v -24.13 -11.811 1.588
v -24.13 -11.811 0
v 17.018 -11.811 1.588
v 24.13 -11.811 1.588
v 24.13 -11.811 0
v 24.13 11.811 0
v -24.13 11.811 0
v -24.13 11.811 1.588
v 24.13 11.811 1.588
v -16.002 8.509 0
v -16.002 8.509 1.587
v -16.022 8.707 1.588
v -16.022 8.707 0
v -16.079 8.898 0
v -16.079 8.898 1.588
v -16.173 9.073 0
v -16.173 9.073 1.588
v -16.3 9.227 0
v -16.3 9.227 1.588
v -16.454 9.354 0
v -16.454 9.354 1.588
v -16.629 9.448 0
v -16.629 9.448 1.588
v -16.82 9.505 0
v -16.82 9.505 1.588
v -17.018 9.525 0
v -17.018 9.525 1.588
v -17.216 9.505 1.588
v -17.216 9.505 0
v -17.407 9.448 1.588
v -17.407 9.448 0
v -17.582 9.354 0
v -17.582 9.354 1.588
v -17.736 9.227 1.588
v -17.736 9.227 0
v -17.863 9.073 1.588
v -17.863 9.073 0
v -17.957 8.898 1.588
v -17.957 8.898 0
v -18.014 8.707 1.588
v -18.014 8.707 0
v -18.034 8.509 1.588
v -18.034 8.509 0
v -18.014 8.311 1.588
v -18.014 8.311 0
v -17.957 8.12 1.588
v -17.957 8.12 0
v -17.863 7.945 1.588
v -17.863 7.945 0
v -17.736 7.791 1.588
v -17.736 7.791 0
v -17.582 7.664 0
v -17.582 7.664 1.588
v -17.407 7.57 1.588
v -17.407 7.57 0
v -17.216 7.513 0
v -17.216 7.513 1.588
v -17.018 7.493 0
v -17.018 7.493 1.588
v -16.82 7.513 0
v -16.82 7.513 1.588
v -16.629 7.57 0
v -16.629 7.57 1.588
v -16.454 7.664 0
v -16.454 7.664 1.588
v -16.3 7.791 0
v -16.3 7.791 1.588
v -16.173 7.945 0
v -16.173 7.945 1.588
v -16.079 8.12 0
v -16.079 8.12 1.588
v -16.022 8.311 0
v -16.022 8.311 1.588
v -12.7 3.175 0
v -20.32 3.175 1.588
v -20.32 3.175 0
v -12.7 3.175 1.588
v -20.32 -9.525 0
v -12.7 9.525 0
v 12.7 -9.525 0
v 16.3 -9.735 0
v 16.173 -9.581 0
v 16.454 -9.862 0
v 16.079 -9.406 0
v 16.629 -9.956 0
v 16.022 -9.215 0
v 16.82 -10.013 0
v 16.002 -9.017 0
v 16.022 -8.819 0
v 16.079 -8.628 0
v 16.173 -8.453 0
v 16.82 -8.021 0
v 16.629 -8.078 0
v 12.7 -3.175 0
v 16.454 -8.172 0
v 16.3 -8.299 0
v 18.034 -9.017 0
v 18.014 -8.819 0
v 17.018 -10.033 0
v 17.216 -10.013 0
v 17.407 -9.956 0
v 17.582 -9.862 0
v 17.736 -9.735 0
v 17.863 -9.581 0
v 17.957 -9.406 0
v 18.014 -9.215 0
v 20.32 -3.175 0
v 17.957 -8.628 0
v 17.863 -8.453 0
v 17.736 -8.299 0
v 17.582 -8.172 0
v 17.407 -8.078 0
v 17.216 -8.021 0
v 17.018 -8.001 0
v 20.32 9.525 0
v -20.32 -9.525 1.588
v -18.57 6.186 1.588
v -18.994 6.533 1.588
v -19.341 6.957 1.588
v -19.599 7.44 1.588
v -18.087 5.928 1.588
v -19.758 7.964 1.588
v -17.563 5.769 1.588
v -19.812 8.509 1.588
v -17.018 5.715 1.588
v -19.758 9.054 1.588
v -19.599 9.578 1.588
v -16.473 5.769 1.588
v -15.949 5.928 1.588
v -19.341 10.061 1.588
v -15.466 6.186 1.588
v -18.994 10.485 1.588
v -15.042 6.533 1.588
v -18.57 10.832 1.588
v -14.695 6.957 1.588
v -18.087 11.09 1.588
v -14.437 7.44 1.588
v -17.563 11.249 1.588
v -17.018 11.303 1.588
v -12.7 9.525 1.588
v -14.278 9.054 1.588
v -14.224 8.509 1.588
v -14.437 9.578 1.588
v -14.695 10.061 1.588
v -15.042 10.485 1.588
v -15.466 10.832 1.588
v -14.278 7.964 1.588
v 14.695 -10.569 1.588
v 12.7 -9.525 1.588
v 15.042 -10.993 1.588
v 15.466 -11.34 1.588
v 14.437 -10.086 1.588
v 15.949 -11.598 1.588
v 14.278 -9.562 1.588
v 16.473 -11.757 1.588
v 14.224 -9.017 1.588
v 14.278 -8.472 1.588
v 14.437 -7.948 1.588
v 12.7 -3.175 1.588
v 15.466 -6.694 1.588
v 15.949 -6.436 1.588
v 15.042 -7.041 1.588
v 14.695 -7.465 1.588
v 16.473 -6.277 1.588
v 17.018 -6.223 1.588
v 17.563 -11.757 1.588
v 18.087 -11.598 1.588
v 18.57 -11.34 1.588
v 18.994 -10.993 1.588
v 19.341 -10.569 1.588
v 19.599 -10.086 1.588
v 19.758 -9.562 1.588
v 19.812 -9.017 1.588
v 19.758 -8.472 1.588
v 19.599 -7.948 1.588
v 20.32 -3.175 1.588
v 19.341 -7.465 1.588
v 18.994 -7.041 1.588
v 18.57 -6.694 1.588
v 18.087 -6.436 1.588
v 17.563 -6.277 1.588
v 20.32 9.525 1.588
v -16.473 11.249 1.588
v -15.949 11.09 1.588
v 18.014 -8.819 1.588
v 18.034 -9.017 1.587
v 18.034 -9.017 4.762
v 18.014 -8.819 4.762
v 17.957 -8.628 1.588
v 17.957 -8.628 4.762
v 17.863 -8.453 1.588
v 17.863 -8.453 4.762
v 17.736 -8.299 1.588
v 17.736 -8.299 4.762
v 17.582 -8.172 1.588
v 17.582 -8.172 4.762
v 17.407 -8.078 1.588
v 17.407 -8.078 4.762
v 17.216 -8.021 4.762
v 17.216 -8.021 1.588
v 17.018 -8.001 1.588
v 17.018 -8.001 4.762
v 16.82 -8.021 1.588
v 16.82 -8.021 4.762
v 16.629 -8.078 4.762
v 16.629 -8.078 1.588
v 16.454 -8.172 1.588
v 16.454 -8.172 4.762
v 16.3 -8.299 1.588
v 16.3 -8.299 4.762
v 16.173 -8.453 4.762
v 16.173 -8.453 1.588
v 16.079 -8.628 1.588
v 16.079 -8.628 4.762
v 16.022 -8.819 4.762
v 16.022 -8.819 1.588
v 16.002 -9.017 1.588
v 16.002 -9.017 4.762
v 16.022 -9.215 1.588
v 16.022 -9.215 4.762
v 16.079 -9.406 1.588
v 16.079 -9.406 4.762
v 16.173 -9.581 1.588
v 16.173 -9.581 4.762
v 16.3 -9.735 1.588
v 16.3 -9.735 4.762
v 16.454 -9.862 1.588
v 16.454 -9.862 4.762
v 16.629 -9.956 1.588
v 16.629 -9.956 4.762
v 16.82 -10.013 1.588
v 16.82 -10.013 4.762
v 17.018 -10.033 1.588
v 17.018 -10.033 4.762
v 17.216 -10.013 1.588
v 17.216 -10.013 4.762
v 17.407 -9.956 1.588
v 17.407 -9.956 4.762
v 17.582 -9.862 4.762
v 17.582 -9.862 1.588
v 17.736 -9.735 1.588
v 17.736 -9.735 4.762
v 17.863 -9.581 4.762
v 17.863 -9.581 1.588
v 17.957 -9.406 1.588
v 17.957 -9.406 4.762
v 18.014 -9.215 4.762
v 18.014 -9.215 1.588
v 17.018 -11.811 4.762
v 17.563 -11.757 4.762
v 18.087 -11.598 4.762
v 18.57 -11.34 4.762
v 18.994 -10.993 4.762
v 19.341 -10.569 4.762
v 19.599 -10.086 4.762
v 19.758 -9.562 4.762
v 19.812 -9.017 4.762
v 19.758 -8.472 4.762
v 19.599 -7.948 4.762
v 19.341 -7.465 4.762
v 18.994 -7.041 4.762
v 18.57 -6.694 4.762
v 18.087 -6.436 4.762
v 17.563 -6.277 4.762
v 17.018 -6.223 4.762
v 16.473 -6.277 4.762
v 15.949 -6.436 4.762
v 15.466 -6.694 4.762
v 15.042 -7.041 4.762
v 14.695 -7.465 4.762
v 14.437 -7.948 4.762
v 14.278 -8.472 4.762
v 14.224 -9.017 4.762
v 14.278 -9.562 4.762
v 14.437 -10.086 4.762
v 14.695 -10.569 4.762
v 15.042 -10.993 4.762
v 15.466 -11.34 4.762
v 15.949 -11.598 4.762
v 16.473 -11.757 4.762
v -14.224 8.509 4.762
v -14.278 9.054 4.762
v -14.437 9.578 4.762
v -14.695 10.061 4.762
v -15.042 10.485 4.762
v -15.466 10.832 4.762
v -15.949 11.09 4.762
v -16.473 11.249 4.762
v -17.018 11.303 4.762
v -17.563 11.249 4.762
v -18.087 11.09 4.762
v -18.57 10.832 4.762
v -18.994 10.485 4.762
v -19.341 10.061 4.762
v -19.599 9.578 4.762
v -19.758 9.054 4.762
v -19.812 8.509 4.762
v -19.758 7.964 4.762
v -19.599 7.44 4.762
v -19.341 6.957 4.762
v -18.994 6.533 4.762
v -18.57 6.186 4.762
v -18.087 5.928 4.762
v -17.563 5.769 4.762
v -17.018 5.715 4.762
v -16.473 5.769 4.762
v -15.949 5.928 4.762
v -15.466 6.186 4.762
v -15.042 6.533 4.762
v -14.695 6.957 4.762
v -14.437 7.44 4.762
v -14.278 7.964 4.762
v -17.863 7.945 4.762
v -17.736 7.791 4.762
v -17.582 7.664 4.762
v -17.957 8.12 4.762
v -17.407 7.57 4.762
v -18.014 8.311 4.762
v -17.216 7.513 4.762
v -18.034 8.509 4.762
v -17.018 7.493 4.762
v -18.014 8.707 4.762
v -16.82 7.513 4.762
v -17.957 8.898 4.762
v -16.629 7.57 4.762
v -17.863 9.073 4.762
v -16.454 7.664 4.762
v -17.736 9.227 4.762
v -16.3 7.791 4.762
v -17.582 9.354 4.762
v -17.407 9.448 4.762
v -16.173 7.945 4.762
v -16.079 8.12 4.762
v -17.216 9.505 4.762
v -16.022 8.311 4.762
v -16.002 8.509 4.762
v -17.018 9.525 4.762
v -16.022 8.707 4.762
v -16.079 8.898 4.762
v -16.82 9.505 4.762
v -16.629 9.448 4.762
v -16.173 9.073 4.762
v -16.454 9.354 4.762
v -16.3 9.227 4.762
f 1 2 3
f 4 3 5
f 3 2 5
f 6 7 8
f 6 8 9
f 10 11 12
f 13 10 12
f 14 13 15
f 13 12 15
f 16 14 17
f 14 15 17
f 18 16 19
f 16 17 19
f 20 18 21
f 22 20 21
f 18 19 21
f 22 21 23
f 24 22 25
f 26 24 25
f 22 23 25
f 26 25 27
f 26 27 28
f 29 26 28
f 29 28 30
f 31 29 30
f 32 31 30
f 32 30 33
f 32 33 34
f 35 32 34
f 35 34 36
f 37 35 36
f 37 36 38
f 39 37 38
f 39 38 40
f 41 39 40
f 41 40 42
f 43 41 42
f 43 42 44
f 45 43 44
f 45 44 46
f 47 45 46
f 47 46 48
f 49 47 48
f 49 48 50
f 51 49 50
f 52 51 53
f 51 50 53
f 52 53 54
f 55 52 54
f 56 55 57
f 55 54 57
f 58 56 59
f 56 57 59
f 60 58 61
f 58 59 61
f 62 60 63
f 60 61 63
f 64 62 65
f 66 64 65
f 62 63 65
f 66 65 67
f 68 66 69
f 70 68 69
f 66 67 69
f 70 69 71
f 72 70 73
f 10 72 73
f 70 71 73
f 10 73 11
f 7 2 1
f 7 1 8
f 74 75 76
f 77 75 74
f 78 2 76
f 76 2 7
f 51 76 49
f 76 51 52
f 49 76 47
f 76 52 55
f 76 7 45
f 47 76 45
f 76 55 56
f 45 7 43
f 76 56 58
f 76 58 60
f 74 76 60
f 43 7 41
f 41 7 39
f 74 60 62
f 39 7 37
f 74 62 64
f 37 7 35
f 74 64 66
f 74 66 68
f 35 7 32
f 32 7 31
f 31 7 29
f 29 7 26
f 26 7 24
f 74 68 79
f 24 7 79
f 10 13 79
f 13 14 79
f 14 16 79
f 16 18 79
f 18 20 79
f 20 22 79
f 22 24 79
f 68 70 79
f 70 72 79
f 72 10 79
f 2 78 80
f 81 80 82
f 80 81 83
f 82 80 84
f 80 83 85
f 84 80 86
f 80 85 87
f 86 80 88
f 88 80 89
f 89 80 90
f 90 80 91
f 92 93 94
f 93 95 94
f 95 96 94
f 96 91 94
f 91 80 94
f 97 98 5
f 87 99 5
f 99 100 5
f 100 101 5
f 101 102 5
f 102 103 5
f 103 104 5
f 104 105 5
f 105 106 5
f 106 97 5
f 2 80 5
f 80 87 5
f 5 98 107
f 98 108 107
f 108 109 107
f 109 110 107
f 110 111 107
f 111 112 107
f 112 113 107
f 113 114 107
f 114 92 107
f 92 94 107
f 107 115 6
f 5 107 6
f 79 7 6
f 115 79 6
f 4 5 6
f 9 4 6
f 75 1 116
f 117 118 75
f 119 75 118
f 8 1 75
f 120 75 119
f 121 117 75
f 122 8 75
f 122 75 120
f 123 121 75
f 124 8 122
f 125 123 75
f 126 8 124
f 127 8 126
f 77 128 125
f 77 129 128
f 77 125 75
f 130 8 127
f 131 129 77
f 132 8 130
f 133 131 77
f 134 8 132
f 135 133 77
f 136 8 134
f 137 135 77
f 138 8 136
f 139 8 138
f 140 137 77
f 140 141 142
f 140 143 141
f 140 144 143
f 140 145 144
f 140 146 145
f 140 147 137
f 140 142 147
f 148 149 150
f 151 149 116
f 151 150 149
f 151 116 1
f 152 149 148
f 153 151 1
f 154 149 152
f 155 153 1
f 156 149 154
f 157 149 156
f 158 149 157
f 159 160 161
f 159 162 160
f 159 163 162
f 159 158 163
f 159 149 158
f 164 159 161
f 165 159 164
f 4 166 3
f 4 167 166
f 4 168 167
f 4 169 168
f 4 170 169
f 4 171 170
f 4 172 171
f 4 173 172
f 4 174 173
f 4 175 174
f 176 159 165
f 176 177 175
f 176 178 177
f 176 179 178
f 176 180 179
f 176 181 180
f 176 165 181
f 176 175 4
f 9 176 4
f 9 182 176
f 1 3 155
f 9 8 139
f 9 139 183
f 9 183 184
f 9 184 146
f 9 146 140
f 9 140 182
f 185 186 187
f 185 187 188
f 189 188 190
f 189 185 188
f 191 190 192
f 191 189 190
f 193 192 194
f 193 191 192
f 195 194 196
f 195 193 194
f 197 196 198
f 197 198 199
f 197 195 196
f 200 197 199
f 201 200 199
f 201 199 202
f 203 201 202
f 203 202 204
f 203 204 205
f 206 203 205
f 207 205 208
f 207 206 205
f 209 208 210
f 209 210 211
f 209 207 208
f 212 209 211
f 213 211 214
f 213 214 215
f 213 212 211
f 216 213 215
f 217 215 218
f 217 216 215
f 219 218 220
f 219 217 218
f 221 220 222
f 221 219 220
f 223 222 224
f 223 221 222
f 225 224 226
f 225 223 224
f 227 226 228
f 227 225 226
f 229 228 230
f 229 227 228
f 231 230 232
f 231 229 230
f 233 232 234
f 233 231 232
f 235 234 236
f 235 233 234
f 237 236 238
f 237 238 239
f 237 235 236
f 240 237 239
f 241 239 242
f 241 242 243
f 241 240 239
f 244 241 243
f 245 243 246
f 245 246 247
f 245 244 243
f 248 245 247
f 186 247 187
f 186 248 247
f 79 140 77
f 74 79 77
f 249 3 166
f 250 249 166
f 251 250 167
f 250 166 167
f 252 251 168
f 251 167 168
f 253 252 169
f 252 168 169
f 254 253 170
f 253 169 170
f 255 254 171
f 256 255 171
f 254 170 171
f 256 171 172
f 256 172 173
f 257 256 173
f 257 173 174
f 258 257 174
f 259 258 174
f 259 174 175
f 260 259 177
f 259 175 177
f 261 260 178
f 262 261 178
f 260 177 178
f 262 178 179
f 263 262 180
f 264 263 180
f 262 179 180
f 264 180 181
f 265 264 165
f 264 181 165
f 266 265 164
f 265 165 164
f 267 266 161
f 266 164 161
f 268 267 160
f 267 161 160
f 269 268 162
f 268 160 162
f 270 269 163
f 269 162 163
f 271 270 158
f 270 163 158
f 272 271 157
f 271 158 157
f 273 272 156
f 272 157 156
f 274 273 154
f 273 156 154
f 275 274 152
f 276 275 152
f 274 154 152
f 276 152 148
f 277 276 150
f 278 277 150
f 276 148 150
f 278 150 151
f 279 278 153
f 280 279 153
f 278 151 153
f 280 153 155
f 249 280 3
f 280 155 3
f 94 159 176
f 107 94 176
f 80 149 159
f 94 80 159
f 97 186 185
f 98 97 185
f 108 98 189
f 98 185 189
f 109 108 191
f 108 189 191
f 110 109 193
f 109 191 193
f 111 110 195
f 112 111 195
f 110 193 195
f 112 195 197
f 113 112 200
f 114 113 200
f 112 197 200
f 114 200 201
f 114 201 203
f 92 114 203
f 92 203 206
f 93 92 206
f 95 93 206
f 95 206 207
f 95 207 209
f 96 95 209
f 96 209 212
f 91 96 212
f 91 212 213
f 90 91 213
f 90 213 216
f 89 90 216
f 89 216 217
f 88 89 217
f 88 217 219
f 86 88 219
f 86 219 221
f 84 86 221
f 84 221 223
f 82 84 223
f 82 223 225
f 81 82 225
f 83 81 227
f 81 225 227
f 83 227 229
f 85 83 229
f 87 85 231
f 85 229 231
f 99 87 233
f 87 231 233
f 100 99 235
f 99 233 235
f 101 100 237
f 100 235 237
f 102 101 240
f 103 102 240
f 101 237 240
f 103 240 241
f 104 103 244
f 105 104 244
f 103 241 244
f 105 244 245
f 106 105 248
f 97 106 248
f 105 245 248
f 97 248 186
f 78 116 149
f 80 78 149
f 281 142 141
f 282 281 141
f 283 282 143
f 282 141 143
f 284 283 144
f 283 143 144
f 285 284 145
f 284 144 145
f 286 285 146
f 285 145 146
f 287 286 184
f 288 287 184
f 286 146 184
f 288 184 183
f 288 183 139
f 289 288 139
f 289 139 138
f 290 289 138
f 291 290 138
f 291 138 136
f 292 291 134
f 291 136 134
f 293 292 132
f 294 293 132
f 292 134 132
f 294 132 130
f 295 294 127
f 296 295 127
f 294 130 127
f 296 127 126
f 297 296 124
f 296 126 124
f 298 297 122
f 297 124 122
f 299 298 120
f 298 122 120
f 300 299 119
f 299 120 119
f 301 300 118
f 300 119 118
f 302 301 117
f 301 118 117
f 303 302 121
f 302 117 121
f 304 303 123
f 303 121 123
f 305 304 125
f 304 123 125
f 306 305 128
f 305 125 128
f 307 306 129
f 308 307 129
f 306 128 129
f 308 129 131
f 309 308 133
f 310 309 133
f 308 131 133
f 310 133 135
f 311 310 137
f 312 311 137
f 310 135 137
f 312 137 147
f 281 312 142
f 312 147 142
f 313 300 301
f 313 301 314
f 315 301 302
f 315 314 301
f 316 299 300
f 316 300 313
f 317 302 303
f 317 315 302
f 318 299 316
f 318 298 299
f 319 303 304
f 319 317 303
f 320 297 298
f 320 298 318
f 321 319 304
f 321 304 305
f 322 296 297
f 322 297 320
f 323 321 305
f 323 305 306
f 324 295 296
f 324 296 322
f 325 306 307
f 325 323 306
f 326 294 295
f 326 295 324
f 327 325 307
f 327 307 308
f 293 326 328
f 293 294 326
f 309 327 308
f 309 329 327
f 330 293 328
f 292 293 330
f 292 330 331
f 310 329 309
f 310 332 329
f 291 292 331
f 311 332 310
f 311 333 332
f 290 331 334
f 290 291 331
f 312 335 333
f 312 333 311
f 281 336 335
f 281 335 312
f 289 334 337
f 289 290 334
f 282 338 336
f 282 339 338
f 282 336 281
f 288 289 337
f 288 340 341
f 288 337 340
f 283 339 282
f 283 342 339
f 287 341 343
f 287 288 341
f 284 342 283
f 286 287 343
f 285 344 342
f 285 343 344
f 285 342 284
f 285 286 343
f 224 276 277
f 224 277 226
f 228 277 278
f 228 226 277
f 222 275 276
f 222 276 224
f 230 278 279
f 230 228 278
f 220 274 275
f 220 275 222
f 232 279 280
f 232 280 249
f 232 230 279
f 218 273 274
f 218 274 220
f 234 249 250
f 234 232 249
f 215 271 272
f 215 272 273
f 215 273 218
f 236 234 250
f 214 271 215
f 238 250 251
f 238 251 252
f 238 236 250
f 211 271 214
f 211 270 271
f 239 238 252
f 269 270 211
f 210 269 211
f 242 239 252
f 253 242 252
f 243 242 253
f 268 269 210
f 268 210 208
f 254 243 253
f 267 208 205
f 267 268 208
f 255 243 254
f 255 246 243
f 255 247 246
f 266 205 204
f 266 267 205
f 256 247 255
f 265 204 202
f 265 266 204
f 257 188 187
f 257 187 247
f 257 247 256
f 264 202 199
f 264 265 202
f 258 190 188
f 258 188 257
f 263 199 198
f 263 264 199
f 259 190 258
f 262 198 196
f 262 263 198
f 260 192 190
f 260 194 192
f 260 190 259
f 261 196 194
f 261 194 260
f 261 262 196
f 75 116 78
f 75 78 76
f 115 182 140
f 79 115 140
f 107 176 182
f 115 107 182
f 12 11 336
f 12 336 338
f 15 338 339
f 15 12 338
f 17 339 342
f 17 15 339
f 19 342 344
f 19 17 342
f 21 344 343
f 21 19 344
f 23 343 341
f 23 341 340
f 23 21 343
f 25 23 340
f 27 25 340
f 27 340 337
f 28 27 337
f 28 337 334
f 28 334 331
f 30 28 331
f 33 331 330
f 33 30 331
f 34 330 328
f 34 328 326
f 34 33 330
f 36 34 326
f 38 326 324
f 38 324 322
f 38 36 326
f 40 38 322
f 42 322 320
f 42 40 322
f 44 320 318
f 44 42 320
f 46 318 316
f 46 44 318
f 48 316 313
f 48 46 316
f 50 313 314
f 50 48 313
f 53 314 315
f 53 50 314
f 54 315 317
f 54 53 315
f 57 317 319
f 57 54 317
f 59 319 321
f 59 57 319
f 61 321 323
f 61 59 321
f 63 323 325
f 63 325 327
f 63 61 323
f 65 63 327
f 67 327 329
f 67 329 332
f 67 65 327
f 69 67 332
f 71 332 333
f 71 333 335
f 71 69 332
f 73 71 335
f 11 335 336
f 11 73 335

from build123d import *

# Parameters (mm, degrees)
F0_W     = 48.26
F0_H     = 23.622
F1_DEPTH = 1.5875
F2_R     = 2.794
F2_R_2   = 1.016
F3_DEPTH = 3.175
F4_DEPTH = 6.35
F5_W     = 7.62
F5_H     = 12.7
F6_DEPTH = 6.35


with BuildPart() as f1:
    # F0 (on Top) → F1 (new body)
    with BuildSketch(Plane.XY):
        Rectangle(F0_W, F0_H)
    extrude(amount=F1_DEPTH)

    # F2 (on face) → F3 (join)
    with BuildSketch(Plane.XY.offset(1.5875)):
        with Locations((-17.018, 8.509)):
            Circle(F2_R)
        with Locations((-17.018, 8.509)):
            Circle(F2_R_2, mode=Mode.SUBTRACT)
        with Locations((17.018, -9.017)):
            Circle(F2_R)
        with Locations((17.018, -9.017)):
            Circle(F2_R_2, mode=Mode.SUBTRACT)
        with BuildLine():
            ThreePointArc((17.018, -11.811), (18.993656, -10.992656), (19.812, -9.017))
            ThreePointArc((19.812, -9.017), (15.042344, -7.041344), (17.018, -11.811))
        make_face()
        with Locations((17.018, -9.017)):
            Circle(F2_R_2, mode=Mode.SUBTRACT)
    extrude(amount=F3_DEPTH)

    # F2 (on face) → F4 (cut)
    with BuildSketch(Plane.XY.offset(1.5875)):
        with Locations((-17.018, 8.509)):
            Circle(F2_R_2)
        with Locations((17.018, -9.017)):
            Circle(F2_R_2)
    extrude(amount=-F4_DEPTH, mode=Mode.SUBTRACT)

    # F5 (on face) → F6 (cut)
    with BuildSketch(Plane.XY.offset(1.5875)):
        Polygon((-12.7, -9.525), (12.7, -9.525), (12.7, -3.175), (12.7, 9.525), (-12.7, 9.525), (-12.7, 3.175), align=None)
        with Locations((16.51, 3.175)):
            Rectangle(F5_W, F5_H)
        with Locations((-16.51, -3.175)):
            Rectangle(F5_W, F5_H)
    extrude(amount=-F6_DEPTH, mode=Mode.SUBTRACT)


solid = f1.part
